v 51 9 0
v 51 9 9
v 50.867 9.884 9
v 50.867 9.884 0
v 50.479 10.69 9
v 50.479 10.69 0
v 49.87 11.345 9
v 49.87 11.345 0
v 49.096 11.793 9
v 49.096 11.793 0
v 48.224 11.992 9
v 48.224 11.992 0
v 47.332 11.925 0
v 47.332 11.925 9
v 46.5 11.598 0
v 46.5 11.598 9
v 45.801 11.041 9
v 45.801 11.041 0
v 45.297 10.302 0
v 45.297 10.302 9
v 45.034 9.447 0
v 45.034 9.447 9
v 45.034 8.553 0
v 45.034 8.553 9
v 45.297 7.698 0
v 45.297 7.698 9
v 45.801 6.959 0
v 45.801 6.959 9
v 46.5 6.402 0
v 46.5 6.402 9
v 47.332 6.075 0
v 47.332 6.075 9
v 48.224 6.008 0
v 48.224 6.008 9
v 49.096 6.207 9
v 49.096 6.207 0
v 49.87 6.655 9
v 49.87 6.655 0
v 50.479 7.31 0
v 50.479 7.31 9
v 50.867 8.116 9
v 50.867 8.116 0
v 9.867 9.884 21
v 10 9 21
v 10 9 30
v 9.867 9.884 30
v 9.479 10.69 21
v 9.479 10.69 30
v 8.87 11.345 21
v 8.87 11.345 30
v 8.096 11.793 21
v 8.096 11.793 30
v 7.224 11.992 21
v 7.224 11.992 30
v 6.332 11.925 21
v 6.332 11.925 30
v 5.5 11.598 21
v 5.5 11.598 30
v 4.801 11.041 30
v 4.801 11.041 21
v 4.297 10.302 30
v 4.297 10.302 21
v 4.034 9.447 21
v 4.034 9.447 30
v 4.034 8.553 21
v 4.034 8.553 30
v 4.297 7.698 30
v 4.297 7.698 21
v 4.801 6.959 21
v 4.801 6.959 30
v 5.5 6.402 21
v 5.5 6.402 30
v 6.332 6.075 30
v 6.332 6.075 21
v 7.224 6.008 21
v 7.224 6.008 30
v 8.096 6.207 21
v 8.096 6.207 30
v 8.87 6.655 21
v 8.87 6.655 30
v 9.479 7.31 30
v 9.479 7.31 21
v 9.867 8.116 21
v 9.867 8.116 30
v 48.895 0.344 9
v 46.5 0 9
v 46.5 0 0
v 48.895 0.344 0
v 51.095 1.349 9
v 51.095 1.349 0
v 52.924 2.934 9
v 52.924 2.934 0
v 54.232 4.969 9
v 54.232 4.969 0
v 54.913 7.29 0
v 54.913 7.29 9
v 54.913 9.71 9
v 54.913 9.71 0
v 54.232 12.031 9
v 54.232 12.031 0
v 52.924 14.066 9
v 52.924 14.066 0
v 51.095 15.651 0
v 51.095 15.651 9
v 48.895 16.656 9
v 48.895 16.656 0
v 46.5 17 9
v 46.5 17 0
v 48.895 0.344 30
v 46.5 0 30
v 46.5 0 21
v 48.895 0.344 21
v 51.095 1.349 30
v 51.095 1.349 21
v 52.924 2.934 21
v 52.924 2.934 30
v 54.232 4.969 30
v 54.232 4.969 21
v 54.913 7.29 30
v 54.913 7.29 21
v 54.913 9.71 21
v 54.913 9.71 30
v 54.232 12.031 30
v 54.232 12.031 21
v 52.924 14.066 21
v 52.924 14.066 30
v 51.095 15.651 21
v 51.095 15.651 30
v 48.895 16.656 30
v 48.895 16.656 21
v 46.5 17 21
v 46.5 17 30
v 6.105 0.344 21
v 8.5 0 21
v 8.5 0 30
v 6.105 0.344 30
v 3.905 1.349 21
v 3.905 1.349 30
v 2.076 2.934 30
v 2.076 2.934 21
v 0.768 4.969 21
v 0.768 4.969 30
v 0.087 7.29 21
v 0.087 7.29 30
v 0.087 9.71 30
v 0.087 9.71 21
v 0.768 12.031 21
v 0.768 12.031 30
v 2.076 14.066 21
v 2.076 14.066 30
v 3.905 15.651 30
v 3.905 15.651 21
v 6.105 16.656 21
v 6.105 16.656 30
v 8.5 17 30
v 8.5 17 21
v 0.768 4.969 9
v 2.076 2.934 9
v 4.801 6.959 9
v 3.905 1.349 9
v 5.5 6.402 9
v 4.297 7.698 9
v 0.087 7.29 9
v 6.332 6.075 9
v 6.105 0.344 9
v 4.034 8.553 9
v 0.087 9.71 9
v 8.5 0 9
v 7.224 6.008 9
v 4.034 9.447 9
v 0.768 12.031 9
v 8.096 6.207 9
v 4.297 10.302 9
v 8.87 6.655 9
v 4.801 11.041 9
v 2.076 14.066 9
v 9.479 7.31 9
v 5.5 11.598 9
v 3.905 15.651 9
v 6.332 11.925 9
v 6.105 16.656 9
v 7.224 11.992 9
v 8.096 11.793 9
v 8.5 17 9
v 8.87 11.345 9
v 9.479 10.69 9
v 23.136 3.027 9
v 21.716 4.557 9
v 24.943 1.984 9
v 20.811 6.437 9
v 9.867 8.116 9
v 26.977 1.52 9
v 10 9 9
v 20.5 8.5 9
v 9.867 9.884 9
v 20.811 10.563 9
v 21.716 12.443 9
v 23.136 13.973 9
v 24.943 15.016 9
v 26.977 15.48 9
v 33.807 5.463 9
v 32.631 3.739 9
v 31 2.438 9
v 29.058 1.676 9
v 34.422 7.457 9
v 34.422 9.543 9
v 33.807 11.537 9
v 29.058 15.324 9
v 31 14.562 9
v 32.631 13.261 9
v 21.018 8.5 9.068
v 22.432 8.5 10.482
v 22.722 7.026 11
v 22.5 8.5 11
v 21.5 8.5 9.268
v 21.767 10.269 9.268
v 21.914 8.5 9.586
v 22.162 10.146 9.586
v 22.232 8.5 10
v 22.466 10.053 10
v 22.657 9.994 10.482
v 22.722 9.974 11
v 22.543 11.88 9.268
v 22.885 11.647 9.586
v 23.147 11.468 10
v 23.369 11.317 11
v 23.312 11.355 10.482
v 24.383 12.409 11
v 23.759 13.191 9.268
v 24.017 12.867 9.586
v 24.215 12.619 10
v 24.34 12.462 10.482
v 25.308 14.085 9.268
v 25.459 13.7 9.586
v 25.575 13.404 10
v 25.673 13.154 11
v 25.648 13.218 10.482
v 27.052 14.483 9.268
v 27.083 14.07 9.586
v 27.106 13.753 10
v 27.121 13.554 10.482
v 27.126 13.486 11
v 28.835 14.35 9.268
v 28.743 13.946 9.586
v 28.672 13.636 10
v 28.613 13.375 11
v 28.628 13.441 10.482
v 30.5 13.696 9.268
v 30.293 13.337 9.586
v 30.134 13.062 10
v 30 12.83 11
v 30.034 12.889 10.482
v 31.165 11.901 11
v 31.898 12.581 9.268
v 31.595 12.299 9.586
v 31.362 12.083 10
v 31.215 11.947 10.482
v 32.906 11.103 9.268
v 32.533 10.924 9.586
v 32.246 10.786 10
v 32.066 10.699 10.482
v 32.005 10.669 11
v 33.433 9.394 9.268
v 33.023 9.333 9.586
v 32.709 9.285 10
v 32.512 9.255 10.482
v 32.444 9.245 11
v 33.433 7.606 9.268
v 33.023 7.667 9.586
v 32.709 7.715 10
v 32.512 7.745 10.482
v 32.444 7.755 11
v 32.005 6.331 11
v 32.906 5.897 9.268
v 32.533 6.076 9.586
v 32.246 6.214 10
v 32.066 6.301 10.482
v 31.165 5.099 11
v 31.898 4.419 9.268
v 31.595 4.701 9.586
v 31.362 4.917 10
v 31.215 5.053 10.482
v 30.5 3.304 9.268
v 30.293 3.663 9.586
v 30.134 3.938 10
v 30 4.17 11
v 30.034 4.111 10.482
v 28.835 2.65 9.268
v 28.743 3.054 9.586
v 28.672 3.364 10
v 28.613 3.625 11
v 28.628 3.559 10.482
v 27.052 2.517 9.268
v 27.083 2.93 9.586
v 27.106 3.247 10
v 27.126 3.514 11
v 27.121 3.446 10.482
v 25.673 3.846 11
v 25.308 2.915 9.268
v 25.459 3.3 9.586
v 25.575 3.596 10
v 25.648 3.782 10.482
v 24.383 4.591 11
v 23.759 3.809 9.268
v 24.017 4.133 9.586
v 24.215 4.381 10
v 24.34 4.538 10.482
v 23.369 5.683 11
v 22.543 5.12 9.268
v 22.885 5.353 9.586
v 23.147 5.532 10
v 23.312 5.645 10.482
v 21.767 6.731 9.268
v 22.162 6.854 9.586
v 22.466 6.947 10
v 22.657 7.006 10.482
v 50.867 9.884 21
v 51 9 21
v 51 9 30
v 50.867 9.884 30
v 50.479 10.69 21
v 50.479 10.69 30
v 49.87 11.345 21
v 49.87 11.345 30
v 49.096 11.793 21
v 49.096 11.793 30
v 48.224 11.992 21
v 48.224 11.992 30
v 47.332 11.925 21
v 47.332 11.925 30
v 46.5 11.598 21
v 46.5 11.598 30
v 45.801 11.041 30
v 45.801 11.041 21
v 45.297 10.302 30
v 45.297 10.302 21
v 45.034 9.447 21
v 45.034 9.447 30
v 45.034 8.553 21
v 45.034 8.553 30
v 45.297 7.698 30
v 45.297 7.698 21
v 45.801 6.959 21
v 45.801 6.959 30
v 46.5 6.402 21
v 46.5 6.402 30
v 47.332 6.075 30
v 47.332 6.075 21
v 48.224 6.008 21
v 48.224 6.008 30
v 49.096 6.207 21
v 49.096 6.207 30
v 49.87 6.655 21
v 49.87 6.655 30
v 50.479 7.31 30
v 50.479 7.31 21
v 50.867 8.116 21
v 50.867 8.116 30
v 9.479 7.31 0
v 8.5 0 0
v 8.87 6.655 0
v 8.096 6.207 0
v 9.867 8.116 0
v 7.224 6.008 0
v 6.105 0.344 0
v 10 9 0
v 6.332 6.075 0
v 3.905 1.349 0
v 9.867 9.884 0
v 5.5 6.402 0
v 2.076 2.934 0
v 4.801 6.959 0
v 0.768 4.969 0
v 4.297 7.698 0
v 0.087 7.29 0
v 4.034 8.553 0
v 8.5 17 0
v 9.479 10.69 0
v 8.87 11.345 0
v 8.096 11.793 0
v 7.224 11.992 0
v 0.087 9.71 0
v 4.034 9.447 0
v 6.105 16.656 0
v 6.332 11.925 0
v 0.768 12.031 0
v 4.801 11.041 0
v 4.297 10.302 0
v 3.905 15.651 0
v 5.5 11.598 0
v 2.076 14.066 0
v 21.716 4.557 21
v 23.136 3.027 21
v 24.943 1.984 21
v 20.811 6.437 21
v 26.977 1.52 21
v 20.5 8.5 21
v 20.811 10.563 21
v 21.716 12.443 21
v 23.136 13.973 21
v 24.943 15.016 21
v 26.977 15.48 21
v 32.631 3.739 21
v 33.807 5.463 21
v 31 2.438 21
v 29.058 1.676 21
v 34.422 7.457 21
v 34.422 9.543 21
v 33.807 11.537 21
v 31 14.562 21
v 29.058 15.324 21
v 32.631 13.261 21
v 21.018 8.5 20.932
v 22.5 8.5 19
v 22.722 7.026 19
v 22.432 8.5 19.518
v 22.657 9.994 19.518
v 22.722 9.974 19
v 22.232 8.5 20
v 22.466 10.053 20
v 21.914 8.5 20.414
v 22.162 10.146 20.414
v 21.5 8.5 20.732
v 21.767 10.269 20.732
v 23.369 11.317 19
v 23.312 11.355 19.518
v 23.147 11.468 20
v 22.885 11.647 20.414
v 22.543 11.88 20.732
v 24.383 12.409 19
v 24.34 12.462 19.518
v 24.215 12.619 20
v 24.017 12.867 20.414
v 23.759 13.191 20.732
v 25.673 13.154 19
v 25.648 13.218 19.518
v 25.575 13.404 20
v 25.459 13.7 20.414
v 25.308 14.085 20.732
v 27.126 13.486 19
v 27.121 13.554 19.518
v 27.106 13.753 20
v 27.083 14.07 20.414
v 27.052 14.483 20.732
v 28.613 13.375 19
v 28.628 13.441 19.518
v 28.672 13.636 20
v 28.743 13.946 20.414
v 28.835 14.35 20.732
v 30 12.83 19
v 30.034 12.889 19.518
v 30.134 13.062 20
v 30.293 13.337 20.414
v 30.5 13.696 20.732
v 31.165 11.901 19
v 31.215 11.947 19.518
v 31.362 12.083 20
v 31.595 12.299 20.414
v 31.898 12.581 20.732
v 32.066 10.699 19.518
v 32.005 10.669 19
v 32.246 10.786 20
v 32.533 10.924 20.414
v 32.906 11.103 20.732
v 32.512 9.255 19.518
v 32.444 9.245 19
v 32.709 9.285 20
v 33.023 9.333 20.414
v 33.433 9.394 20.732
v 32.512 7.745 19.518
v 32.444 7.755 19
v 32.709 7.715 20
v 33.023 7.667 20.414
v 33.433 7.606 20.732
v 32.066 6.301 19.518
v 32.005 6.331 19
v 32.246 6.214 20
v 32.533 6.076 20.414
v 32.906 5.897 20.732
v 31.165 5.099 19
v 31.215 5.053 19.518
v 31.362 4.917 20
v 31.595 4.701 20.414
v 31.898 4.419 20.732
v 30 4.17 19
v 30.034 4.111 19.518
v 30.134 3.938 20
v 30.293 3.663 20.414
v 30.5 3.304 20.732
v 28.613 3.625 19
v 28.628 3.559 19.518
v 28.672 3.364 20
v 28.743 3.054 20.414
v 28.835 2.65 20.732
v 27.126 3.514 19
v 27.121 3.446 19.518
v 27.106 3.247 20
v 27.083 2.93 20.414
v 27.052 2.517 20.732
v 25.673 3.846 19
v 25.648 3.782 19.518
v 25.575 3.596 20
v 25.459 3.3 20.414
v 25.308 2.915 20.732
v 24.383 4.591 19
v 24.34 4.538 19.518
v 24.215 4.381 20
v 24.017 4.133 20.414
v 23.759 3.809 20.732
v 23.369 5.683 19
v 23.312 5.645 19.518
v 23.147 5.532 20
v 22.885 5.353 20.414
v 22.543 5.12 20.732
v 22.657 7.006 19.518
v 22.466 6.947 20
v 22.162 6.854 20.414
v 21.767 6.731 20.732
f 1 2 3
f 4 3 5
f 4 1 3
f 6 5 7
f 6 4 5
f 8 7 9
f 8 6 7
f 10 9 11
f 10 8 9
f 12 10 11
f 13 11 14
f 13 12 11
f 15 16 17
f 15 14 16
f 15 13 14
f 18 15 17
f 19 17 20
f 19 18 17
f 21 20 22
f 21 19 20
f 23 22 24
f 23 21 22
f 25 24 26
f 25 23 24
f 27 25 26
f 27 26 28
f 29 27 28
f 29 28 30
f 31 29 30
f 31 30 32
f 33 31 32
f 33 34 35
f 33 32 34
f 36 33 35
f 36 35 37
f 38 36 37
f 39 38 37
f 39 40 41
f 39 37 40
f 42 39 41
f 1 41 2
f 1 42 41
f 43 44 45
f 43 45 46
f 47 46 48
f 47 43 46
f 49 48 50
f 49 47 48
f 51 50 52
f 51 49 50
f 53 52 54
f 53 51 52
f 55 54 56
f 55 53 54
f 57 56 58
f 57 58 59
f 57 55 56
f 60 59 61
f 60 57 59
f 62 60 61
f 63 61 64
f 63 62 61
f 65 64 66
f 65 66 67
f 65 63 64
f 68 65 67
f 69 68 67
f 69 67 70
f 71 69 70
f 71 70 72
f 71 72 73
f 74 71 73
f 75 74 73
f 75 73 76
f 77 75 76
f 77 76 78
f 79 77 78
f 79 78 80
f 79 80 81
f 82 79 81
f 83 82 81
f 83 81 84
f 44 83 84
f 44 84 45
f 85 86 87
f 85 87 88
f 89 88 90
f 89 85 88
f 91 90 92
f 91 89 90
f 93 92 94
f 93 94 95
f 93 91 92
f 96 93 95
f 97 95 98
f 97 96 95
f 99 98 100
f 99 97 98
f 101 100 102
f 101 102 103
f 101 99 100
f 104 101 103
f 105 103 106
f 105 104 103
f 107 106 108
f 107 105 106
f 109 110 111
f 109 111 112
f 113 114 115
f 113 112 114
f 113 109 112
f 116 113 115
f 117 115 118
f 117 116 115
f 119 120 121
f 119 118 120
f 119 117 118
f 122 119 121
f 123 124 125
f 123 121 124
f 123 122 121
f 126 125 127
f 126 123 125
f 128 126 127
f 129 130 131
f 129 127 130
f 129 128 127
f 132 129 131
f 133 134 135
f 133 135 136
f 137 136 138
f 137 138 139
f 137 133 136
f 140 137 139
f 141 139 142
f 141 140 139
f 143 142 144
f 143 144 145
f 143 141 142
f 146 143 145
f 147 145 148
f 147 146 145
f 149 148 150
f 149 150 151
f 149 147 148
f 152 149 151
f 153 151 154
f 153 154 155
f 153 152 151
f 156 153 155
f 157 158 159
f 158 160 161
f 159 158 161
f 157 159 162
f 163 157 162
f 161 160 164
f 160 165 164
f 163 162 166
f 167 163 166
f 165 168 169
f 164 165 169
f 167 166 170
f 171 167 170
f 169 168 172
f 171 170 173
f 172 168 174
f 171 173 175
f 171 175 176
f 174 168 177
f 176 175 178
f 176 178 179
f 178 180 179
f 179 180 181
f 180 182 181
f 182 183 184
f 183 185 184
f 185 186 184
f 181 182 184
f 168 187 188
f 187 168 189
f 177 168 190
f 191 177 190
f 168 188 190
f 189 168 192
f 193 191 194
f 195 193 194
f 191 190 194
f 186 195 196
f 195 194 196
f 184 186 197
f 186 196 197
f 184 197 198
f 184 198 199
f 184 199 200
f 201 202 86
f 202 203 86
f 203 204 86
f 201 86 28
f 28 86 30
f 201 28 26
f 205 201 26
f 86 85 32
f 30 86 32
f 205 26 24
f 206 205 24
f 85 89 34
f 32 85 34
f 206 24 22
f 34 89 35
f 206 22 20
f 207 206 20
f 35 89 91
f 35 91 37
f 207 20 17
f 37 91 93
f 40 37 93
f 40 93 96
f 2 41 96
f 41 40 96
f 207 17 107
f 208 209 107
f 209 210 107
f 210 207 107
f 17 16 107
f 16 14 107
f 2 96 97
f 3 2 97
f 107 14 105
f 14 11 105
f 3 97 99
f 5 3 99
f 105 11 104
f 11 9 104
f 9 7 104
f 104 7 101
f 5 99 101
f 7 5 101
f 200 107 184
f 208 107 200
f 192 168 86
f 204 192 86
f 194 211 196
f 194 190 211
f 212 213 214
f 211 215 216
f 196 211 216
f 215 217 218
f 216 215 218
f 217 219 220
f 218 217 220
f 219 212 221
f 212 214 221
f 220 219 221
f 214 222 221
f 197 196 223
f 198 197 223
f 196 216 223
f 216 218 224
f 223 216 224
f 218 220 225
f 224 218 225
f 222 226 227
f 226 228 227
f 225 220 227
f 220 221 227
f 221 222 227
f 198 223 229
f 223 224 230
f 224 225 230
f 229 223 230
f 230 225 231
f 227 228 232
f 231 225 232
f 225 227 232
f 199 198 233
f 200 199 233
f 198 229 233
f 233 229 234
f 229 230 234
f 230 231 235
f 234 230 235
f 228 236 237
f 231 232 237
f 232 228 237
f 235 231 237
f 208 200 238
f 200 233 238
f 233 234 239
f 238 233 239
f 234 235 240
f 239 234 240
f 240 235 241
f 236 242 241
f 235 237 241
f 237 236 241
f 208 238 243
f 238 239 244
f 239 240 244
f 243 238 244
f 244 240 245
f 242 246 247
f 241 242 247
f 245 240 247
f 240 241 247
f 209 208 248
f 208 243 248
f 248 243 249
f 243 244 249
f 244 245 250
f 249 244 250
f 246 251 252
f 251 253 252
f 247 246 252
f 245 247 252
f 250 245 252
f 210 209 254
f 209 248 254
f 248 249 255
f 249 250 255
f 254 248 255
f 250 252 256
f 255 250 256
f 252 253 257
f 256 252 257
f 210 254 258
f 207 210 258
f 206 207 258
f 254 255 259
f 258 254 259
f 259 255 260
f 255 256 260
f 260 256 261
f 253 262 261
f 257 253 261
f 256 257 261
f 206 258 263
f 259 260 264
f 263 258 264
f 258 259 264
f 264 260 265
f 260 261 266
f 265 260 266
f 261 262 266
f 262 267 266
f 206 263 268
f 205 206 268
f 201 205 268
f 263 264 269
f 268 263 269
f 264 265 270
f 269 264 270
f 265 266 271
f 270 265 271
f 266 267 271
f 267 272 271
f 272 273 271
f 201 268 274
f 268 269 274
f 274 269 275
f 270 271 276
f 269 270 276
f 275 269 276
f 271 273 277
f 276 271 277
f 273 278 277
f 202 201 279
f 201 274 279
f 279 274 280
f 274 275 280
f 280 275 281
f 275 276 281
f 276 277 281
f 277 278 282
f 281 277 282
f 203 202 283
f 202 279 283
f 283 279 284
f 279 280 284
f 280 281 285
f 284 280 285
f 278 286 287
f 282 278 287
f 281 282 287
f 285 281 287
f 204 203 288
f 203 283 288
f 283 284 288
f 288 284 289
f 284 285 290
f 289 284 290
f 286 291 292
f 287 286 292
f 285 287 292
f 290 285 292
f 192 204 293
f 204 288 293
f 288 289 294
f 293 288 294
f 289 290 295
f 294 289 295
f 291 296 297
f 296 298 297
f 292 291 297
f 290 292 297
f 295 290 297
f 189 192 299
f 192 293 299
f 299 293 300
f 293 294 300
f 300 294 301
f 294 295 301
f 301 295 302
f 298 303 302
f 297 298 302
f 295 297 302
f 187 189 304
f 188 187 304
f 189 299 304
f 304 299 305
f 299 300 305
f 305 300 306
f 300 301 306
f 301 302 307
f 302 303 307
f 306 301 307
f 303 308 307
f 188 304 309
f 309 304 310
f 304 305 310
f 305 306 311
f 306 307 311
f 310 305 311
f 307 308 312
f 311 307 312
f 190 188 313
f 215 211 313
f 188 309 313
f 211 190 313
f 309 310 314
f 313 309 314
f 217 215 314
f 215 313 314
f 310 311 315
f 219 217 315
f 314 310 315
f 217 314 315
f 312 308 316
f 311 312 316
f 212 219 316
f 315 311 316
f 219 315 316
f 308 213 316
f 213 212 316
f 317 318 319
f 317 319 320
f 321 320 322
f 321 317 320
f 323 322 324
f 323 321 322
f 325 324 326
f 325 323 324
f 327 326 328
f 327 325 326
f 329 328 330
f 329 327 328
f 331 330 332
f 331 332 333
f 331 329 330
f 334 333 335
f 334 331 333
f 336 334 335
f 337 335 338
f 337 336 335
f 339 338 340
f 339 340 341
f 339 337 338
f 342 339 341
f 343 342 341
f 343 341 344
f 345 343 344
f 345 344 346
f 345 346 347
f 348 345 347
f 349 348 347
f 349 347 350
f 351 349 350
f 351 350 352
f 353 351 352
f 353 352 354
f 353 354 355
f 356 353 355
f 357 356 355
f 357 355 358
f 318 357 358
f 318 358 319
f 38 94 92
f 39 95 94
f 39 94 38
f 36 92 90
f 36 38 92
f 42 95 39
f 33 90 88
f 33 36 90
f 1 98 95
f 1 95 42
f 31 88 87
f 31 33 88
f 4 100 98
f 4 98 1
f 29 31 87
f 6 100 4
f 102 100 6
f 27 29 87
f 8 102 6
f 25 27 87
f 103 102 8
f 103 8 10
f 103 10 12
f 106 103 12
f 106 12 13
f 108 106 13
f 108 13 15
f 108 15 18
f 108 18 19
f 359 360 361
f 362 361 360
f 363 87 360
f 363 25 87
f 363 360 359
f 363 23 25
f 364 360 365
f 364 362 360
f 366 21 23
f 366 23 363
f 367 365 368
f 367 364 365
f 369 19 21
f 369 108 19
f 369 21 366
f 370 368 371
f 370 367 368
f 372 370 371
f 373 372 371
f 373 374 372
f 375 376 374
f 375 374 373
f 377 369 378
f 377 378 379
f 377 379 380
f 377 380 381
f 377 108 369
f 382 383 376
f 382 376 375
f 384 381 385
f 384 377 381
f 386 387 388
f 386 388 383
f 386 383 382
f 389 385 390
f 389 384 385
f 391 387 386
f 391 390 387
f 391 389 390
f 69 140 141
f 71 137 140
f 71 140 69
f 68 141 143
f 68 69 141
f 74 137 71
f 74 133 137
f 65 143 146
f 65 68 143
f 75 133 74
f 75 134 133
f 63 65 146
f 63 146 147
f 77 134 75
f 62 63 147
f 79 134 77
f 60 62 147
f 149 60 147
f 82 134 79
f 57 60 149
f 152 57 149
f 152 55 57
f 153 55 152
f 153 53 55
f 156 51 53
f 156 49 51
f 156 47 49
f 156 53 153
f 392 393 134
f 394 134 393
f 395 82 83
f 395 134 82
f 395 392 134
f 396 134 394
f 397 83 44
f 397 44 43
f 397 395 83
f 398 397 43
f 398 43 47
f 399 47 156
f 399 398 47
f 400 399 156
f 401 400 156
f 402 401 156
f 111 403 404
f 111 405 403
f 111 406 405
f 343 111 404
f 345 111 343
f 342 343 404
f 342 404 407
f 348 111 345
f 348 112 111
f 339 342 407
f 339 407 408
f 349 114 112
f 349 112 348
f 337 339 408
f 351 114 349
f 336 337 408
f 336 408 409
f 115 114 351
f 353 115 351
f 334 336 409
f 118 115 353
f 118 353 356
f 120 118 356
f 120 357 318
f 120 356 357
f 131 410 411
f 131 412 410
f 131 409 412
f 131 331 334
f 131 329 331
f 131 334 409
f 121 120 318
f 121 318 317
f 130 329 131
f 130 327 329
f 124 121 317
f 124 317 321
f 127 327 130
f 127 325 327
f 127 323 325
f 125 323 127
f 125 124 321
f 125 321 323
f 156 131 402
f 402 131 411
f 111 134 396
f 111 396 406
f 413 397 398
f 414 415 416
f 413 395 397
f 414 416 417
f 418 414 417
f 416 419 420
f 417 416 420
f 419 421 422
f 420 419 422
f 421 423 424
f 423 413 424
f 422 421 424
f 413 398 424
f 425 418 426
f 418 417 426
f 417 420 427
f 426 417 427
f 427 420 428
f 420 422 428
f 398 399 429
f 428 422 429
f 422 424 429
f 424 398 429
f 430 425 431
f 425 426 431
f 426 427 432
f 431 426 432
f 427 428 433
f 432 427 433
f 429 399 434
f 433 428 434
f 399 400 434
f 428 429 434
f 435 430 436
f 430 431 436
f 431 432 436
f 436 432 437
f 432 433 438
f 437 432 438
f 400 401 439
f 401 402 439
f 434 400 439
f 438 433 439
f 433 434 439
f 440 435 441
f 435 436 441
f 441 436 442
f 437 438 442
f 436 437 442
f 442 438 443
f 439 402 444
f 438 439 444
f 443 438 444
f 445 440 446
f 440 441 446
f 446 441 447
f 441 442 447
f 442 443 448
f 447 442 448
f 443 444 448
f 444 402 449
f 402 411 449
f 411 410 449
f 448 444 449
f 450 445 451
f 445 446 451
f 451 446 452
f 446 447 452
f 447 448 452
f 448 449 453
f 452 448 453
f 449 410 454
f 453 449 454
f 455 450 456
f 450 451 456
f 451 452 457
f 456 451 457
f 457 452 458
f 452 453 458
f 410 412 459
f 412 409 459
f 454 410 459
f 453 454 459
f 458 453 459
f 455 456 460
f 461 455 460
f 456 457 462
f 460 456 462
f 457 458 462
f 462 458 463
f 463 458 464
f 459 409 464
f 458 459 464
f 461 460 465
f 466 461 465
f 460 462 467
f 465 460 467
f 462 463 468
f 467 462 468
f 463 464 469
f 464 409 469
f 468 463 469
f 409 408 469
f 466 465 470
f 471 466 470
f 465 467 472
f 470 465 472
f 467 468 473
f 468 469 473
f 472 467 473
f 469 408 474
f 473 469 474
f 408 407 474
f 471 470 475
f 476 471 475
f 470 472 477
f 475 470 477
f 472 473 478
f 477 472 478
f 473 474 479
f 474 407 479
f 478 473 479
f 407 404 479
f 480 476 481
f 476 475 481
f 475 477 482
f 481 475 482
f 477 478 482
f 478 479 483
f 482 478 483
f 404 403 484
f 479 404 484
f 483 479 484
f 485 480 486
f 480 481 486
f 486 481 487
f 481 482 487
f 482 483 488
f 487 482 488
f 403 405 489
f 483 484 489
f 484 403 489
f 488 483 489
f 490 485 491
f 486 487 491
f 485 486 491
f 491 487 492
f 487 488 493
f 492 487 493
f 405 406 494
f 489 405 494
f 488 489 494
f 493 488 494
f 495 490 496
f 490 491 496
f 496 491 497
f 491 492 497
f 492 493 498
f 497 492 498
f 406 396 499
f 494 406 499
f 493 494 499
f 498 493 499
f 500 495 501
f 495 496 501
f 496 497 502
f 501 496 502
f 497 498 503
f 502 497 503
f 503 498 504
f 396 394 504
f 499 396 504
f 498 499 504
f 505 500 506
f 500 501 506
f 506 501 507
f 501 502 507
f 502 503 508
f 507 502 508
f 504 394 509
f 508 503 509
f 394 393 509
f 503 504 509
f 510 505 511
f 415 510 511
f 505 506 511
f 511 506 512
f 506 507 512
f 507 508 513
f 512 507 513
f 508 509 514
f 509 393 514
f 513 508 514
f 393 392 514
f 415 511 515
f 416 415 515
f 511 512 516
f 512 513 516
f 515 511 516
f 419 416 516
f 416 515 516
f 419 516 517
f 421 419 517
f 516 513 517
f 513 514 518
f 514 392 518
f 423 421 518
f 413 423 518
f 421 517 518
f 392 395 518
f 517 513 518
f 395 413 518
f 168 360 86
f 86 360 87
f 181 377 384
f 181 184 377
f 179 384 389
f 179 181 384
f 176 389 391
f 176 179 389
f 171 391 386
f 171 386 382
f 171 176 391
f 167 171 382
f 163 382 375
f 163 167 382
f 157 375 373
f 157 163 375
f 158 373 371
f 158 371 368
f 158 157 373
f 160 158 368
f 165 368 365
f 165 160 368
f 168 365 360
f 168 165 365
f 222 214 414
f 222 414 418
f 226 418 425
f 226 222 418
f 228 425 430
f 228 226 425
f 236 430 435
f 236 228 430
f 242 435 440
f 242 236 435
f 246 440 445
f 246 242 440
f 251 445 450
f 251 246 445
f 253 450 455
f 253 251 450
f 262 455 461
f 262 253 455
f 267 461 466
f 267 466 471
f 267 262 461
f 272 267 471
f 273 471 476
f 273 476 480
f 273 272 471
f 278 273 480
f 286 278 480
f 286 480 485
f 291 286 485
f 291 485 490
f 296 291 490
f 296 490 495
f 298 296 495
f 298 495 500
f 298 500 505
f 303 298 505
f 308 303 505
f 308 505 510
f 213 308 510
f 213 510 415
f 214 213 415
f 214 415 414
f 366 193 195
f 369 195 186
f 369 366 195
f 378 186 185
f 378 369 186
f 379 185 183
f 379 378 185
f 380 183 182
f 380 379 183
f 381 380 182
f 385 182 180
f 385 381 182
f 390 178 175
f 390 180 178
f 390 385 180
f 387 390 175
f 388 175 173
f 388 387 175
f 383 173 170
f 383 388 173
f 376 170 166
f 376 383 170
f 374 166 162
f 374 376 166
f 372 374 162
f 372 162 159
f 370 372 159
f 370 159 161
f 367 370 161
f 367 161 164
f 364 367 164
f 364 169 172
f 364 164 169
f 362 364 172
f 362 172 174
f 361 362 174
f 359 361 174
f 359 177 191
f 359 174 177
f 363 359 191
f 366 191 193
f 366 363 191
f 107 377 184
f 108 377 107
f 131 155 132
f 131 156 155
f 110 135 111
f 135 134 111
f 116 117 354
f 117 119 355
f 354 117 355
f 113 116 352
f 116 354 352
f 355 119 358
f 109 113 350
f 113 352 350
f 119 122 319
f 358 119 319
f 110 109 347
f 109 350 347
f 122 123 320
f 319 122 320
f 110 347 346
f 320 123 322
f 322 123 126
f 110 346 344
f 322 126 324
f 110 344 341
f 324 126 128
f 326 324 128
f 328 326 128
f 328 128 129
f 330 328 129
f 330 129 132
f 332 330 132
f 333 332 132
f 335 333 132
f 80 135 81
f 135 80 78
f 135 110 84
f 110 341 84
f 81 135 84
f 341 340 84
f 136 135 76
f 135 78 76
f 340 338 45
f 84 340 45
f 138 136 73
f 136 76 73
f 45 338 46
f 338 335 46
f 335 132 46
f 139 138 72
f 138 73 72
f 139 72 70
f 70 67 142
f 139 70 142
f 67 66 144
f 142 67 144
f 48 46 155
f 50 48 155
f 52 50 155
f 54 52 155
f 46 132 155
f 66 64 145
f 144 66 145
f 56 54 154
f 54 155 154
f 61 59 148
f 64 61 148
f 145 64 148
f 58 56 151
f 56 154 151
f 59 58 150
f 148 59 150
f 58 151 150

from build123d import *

# Parameters (mm, degrees)
SZKIC1_R                    = 3
DODANIE_WYCI_GNI_CIE1_DEPTH = 30
SZKIC2_W                    = 12
SZKIC2_H                    = 17
WYTNIJ_WYCI_GNI_CIE1_DEPTH  = 65.915329468
SZKIC3_R                    = 5
DODANIE_WYCI_GNI_CIE2_DEPTH = 30
ZAOKR_GLENIE3_R             = 2
ZAOKR_GLENIE6_RADIUS        = 8.5
ZAOKR_GLENIE6_LENGTH        = 9
ZAOKR_GLENIE7_RADIUS        = 8.5
ZAOKR_GLENIE7_LENGTH        = 9
ZAOKR_GLENIE8_RADIUS        = 8.5
ZAOKR_GLENIE8_LENGTH        = 9
ZAOKR_GLENIE9_RADIUS        = 8.5
ZAOKR_GLENIE9_LENGTH        = 9


with BuildPart() as part:
    # Szkic1 → Dodanie-wyciągnięcie1 (new body)
    with BuildSketch(Plane.XY):
        Polygon((0, 0), (0, 17), (55, 17), (55, 0), (10, 0), align=None)
        with Locations((48, 9)):
            Circle(SZKIC1_R, mode=Mode.SUBTRACT)
        with Locations((7, 9)):
            Circle(SZKIC1_R, mode=Mode.SUBTRACT)
    extrude(amount=DODANIE_WYCI_GNI_CIE1_DEPTH)

    # Szkic2 → Wytnij-wyciągnięcie1 (cut, through all)
    with BuildSketch(Plane(origin=(55, 0, 0), x_dir=(0, 0, -1), z_dir=(1, 0, 0))):
        with Locations((-15, 8.5)):
            Rectangle(SZKIC2_W, SZKIC2_H)
    extrude(amount=-WYTNIJ_WYCI_GNI_CIE1_DEPTH, mode=Mode.SUBTRACT)


with BuildPart() as wytnij_wyci_gni_cie1_piece_1:
    # of the separate pieces the step leaves, piece 1, a body of its own (wytnij_wyci_gni_cie1_pieces)
    add(part.part.solids().sort_by_distance((0, 0, 21))[0])



with BuildPart() as wytnij_wyci_gni_cie1_piece_2:
    # of the separate pieces the step leaves, piece 2, a body of its own (wytnij_wyci_gni_cie1_pieces)
    add(part.part.solids().sort_by_distance((0, 0, 0))[0])


with BuildPart() as wytnij_wyci_gni_cie1_piece_1_1:
    add(wytnij_wyci_gni_cie1_piece_1.part)

    add(wytnij_wyci_gni_cie1_piece_2.part)  # Dodanie-wyciągnięcie2 merges Wytnij-wyciągnięcie1 piece 2
    # Szkic3 → Dodanie-wyciągnięcie2 (add)
    with BuildSketch(Plane(origin=(0, 0, 0), x_dir=(-1, 0, 0), z_dir=(0, 0, -1))):
        with Locations((-27.5, 8.5)):
            Circle(SZKIC3_R)
    extrude(amount=-DODANIE_WYCI_GNI_CIE2_DEPTH)

    # Zaokrąglenie3
    zaokr_glenie3_edges = [wytnij_wyci_gni_cie1_piece_1_1.edges().sort_by_distance(p)[0] for p in [
        (32.5, 8.5, 9),
        (32.5, 8.5, 21),
    ]]
    fillet(zaokr_glenie3_edges, radius=ZAOKR_GLENIE3_R)

    # Zaokrąglenie6: full round fillet: the end face becomes a half cylinder, R = half its width
    zaokr_glenie6_face = Plane((55, 8.5, 4.5), x_dir=(0, 0, 1), z_dir=(1, 0, 0))  # on the end face: x along it, z out of the body
    zaokr_glenie6_slab = zaokr_glenie6_face.offset(-ZAOKR_GLENIE6_RADIUS / 2) * Box(ZAOKR_GLENIE6_LENGTH, 2 * ZAOKR_GLENIE6_RADIUS, ZAOKR_GLENIE6_RADIUS, mode=Mode.PRIVATE)  # the body's end, R deep
    zaokr_glenie6_round = Plane((46.5, 8.5, 4.5), x_dir=(1, 0, 0), z_dir=(0, 0, 1)) * Cylinder(ZAOKR_GLENIE6_RADIUS, ZAOKR_GLENIE6_LENGTH, mode=Mode.PRIVATE)  # its axis R under the face
    add(zaokr_glenie6_slab - zaokr_glenie6_round, mode=Mode.SUBTRACT)

    # Zaokrąglenie7: full round fillet: the end face becomes a half cylinder, R = half its width
    zaokr_glenie7_face = Plane((55, 8.5, 25.5), x_dir=(0, 0, 1), z_dir=(1, 0, 0))  # on the end face: x along it, z out of the body
    zaokr_glenie7_slab = zaokr_glenie7_face.offset(-ZAOKR_GLENIE7_RADIUS / 2) * Box(ZAOKR_GLENIE7_LENGTH, 2 * ZAOKR_GLENIE7_RADIUS, ZAOKR_GLENIE7_RADIUS, mode=Mode.PRIVATE)  # the body's end, R deep
    zaokr_glenie7_round = Plane((46.5, 8.5, 25.5), x_dir=(1, 0, 0), z_dir=(0, 0, 1)) * Cylinder(ZAOKR_GLENIE7_RADIUS, ZAOKR_GLENIE7_LENGTH, mode=Mode.PRIVATE)  # its axis R under the face
    add(zaokr_glenie7_slab - zaokr_glenie7_round, mode=Mode.SUBTRACT)

    # Zaokrąglenie8: full round fillet: the end face becomes a half cylinder, R = half its width
    zaokr_glenie8_face = Plane((0, 8.5, 4.5), x_dir=(0, 0, 1), z_dir=(-1, 0, 0))  # on the end face: x along it, z out of the body
    zaokr_glenie8_slab = zaokr_glenie8_face.offset(-ZAOKR_GLENIE8_RADIUS / 2) * Box(ZAOKR_GLENIE8_LENGTH, 2 * ZAOKR_GLENIE8_RADIUS, ZAOKR_GLENIE8_RADIUS, mode=Mode.PRIVATE)  # the body's end, R deep
    zaokr_glenie8_round = Plane((8.5, 8.5, 4.5), x_dir=(-1, 0, 0), z_dir=(0, 0, 1)) * Cylinder(ZAOKR_GLENIE8_RADIUS, ZAOKR_GLENIE8_LENGTH, mode=Mode.PRIVATE)  # its axis R under the face
    add(zaokr_glenie8_slab - zaokr_glenie8_round, mode=Mode.SUBTRACT)

    # Zaokrąglenie9: full round fillet: the end face becomes a half cylinder, R = half its width
    zaokr_glenie9_face = Plane((0, 8.5, 25.5), x_dir=(0, 0, -1), z_dir=(-1, 0, 0))  # on the end face: x along it, z out of the body
    zaokr_glenie9_slab = zaokr_glenie9_face.offset(-ZAOKR_GLENIE9_RADIUS / 2) * Box(ZAOKR_GLENIE9_LENGTH, 2 * ZAOKR_GLENIE9_RADIUS, ZAOKR_GLENIE9_RADIUS, mode=Mode.PRIVATE)  # the body's end, R deep
    zaokr_glenie9_round = Plane((8.5, 8.5, 25.5), x_dir=(-1, 0, 0), z_dir=(0, 0, -1)) * Cylinder(ZAOKR_GLENIE9_RADIUS, ZAOKR_GLENIE9_LENGTH, mode=Mode.PRIVATE)  # its axis R under the face
    add(zaokr_glenie9_slab - zaokr_glenie9_round, mode=Mode.SUBTRACT)


solid = wytnij_wyci_gni_cie1_piece_1_1.part
